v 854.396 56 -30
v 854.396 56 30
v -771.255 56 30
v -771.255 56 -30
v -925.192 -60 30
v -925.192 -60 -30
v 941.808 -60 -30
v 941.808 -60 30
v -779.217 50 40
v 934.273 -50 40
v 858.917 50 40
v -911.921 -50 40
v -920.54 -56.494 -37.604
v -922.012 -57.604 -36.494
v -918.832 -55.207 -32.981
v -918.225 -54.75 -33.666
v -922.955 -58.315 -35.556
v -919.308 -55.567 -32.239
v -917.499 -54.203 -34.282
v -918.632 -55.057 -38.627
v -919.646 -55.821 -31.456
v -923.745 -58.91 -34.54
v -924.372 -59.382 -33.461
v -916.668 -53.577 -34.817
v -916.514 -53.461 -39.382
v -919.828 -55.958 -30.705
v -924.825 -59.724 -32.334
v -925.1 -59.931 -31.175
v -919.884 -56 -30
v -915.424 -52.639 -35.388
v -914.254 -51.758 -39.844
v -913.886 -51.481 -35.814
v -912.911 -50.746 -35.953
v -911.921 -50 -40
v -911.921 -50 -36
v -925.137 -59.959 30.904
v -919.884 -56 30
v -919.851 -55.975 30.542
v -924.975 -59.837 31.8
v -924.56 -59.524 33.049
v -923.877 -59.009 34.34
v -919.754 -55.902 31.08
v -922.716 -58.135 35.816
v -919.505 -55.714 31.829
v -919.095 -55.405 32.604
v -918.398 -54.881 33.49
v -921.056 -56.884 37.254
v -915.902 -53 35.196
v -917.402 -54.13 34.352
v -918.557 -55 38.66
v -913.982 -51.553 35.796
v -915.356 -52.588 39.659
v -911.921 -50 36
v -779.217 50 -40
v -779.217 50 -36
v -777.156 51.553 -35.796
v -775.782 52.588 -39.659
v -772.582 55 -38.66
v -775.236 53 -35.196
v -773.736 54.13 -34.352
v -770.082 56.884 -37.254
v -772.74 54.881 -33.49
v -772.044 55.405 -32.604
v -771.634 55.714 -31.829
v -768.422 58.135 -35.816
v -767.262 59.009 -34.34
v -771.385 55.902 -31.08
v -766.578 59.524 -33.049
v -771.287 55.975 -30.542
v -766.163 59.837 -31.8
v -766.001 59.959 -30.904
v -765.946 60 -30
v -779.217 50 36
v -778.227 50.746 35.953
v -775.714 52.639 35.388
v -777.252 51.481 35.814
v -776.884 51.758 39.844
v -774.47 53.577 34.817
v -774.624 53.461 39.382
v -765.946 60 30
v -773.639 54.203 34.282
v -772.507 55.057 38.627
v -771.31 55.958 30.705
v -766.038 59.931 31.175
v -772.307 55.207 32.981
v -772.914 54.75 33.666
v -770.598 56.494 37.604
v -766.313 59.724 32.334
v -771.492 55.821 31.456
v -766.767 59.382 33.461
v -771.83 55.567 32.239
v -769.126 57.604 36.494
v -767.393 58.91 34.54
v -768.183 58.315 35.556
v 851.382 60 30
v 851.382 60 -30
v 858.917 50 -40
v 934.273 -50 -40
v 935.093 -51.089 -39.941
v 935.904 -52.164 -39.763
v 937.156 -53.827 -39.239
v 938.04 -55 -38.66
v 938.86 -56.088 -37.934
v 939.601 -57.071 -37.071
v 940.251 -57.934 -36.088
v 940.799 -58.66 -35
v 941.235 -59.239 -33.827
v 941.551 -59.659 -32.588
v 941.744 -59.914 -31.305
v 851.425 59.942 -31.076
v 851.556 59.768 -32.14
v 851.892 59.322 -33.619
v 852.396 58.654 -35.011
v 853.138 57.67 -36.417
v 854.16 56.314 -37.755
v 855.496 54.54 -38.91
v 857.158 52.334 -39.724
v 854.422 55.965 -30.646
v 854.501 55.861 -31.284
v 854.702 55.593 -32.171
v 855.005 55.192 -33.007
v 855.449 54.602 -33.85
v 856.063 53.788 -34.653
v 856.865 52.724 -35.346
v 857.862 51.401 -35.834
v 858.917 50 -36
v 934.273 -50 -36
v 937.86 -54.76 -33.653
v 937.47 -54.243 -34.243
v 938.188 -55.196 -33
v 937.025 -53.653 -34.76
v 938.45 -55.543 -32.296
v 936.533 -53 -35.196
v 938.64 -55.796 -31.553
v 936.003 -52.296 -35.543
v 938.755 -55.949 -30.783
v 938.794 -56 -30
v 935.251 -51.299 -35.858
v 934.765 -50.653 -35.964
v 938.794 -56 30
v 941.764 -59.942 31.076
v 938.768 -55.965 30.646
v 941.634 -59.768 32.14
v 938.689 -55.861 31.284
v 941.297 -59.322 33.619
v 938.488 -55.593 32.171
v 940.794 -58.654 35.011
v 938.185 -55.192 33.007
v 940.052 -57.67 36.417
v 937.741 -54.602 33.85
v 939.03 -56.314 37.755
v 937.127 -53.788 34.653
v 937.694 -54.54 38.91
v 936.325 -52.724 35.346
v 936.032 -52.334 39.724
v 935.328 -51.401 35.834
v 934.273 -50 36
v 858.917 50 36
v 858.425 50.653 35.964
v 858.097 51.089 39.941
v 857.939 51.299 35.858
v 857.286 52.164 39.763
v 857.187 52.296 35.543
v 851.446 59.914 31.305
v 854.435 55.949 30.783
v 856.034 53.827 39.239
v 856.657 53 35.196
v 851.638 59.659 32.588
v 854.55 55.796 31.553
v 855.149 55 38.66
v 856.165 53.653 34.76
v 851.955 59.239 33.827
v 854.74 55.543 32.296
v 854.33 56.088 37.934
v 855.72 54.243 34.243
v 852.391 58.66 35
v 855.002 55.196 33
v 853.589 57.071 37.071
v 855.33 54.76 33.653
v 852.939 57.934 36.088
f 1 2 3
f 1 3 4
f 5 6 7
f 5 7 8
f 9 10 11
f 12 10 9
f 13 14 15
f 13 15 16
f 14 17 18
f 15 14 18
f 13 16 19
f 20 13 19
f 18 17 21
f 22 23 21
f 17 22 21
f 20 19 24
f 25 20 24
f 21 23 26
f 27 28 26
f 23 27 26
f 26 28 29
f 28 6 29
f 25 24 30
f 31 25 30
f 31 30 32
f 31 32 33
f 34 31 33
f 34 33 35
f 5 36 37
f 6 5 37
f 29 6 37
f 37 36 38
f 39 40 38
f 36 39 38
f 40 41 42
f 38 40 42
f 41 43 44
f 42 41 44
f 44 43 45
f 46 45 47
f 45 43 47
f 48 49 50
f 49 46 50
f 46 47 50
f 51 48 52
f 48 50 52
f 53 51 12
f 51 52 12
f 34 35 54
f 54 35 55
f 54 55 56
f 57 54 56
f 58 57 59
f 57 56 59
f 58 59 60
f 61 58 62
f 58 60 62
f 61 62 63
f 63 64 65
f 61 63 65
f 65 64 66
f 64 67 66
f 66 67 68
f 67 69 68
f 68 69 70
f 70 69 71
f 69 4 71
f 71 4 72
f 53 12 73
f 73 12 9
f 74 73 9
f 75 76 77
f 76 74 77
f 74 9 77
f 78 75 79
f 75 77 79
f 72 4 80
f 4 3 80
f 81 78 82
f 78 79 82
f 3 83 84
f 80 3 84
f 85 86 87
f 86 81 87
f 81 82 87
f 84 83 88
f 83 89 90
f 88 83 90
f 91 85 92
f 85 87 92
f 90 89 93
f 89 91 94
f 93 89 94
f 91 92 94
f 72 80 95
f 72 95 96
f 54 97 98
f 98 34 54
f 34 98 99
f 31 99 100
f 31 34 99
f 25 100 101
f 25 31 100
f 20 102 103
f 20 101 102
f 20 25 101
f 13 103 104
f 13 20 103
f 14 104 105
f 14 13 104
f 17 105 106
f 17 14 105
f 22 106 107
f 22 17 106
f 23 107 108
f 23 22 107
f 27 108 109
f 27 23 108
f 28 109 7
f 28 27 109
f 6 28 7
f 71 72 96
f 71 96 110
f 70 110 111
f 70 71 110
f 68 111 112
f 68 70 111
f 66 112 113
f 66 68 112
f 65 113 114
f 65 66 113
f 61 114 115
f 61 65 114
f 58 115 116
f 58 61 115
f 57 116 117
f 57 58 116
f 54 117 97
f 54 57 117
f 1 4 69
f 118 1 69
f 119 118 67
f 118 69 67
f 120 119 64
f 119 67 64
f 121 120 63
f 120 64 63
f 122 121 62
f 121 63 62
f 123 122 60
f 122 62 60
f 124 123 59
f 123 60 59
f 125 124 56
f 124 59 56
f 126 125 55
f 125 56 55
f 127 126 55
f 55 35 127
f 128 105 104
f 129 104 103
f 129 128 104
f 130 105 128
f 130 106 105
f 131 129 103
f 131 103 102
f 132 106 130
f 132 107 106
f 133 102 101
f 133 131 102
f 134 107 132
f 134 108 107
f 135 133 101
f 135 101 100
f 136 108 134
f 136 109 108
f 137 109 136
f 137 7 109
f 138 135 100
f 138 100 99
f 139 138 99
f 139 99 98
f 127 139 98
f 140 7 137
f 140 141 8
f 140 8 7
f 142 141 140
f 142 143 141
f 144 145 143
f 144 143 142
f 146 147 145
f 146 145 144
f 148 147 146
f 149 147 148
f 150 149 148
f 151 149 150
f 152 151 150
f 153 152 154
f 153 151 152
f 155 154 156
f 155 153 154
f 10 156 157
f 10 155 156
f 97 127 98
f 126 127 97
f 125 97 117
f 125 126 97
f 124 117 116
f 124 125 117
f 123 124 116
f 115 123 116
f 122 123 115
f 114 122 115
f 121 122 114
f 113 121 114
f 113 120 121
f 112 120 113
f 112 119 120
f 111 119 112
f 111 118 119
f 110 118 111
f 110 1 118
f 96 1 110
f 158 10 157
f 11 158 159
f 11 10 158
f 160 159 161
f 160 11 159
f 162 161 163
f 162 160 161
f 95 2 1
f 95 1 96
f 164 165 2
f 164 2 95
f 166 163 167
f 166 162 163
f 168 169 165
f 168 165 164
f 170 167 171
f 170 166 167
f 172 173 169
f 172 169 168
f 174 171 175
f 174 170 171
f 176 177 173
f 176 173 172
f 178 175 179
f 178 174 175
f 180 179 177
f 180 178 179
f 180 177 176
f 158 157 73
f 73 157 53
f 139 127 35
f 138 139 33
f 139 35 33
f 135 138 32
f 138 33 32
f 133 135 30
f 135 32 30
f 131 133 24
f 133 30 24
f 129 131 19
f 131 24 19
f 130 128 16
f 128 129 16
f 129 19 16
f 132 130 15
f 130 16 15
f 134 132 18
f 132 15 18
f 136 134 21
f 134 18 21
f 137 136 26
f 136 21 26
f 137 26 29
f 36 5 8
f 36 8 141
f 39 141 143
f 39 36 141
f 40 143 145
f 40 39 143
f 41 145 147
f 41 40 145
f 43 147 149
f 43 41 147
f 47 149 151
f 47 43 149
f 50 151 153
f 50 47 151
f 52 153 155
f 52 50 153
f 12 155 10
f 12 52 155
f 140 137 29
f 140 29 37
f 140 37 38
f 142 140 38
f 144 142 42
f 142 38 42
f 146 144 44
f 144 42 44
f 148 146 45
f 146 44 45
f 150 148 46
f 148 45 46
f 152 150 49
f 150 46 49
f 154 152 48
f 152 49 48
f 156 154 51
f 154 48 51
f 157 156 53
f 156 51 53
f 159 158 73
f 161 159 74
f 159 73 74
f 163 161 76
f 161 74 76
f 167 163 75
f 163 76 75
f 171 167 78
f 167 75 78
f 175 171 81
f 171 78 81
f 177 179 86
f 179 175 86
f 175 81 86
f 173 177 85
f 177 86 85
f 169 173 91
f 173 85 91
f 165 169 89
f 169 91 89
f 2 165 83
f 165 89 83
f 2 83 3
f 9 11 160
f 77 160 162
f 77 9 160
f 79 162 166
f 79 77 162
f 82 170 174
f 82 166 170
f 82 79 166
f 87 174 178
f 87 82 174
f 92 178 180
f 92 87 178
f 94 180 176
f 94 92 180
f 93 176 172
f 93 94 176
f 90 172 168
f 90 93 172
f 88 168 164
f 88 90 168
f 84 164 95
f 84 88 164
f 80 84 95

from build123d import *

# Parameters (mm, degrees)
EL_MENT_M_CANO_SOUD_1_DEPTH = 1883.6164
EXTRUSION1_DEPTH            = 81
EXTRUSION2_DEPTH            = 81


with BuildPart() as part:
    # Esquisse15 → Elément mécano-soudé1 (new body)
    with BuildSketch(Plane.YZ.offset(-941.8082)):
        with BuildLine():
            Line((-50, 40), (50, 40))
            ThreePointArc((50, 40), (57.071067812, 37.071067812), (60, 30))
            Line((60, 30), (60, -30))
            ThreePointArc((60, -30), (57.071067812, -37.071067812), (50, -40))
            Line((50, -40), (-50, -40))
            ThreePointArc((-50, -40), (-57.071067812, -37.071067812), (-60, -30))
            Line((-60, -30), (-60, 30))
            ThreePointArc((-60, 30), (-57.071067812, 37.071067812), (-50, 40))
        make_face()
        with BuildLine():
            Line((-50, 36), (50, 36))
            ThreePointArc((50, 36), (54.242640687, 34.242640687), (56, 30))
            Line((56, 30), (56, -30))
            ThreePointArc((56, -30), (54.242640687, -34.242640687), (50, -36))
            Line((50, -36), (-50, -36))
            ThreePointArc((-50, -36), (-54.242640687, -34.242640687), (-56, -30))
            Line((-56, -30), (-56, 30))
            ThreePointArc((-56, 30), (-54.242640687, 34.242640687), (-50, 36))
        make_face(mode=Mode.SUBTRACT)
    extrude(amount=EL_MENT_M_CANO_SOUD_1_DEPTH)

    # Esquisse12 → Extrusion1 (cut, through all)
    with BuildSketch(Plane.XY.offset(40)):
        Polygon((941.8082, -60), (851.381713988, 60), (941.8082, 60), align=None)
        Polygon((-941.8082, -60), (-782.562821406, 60), (-941.8082, 60), align=None)
    extrude(amount=-EXTRUSION1_DEPTH, mode=Mode.SUBTRACT)

    # Esquisse13 → Extrusion2 (cut, through all)
    with BuildSketch(Plane.XY.offset(40)):
        Polygon((-1042.175315796, -60), (-925.191798589, -60), (-765.946419994, 60), (-882.929937201, 60), align=None)
    extrude(amount=-EXTRUSION2_DEPTH, mode=Mode.SUBTRACT)


solid = part.part
